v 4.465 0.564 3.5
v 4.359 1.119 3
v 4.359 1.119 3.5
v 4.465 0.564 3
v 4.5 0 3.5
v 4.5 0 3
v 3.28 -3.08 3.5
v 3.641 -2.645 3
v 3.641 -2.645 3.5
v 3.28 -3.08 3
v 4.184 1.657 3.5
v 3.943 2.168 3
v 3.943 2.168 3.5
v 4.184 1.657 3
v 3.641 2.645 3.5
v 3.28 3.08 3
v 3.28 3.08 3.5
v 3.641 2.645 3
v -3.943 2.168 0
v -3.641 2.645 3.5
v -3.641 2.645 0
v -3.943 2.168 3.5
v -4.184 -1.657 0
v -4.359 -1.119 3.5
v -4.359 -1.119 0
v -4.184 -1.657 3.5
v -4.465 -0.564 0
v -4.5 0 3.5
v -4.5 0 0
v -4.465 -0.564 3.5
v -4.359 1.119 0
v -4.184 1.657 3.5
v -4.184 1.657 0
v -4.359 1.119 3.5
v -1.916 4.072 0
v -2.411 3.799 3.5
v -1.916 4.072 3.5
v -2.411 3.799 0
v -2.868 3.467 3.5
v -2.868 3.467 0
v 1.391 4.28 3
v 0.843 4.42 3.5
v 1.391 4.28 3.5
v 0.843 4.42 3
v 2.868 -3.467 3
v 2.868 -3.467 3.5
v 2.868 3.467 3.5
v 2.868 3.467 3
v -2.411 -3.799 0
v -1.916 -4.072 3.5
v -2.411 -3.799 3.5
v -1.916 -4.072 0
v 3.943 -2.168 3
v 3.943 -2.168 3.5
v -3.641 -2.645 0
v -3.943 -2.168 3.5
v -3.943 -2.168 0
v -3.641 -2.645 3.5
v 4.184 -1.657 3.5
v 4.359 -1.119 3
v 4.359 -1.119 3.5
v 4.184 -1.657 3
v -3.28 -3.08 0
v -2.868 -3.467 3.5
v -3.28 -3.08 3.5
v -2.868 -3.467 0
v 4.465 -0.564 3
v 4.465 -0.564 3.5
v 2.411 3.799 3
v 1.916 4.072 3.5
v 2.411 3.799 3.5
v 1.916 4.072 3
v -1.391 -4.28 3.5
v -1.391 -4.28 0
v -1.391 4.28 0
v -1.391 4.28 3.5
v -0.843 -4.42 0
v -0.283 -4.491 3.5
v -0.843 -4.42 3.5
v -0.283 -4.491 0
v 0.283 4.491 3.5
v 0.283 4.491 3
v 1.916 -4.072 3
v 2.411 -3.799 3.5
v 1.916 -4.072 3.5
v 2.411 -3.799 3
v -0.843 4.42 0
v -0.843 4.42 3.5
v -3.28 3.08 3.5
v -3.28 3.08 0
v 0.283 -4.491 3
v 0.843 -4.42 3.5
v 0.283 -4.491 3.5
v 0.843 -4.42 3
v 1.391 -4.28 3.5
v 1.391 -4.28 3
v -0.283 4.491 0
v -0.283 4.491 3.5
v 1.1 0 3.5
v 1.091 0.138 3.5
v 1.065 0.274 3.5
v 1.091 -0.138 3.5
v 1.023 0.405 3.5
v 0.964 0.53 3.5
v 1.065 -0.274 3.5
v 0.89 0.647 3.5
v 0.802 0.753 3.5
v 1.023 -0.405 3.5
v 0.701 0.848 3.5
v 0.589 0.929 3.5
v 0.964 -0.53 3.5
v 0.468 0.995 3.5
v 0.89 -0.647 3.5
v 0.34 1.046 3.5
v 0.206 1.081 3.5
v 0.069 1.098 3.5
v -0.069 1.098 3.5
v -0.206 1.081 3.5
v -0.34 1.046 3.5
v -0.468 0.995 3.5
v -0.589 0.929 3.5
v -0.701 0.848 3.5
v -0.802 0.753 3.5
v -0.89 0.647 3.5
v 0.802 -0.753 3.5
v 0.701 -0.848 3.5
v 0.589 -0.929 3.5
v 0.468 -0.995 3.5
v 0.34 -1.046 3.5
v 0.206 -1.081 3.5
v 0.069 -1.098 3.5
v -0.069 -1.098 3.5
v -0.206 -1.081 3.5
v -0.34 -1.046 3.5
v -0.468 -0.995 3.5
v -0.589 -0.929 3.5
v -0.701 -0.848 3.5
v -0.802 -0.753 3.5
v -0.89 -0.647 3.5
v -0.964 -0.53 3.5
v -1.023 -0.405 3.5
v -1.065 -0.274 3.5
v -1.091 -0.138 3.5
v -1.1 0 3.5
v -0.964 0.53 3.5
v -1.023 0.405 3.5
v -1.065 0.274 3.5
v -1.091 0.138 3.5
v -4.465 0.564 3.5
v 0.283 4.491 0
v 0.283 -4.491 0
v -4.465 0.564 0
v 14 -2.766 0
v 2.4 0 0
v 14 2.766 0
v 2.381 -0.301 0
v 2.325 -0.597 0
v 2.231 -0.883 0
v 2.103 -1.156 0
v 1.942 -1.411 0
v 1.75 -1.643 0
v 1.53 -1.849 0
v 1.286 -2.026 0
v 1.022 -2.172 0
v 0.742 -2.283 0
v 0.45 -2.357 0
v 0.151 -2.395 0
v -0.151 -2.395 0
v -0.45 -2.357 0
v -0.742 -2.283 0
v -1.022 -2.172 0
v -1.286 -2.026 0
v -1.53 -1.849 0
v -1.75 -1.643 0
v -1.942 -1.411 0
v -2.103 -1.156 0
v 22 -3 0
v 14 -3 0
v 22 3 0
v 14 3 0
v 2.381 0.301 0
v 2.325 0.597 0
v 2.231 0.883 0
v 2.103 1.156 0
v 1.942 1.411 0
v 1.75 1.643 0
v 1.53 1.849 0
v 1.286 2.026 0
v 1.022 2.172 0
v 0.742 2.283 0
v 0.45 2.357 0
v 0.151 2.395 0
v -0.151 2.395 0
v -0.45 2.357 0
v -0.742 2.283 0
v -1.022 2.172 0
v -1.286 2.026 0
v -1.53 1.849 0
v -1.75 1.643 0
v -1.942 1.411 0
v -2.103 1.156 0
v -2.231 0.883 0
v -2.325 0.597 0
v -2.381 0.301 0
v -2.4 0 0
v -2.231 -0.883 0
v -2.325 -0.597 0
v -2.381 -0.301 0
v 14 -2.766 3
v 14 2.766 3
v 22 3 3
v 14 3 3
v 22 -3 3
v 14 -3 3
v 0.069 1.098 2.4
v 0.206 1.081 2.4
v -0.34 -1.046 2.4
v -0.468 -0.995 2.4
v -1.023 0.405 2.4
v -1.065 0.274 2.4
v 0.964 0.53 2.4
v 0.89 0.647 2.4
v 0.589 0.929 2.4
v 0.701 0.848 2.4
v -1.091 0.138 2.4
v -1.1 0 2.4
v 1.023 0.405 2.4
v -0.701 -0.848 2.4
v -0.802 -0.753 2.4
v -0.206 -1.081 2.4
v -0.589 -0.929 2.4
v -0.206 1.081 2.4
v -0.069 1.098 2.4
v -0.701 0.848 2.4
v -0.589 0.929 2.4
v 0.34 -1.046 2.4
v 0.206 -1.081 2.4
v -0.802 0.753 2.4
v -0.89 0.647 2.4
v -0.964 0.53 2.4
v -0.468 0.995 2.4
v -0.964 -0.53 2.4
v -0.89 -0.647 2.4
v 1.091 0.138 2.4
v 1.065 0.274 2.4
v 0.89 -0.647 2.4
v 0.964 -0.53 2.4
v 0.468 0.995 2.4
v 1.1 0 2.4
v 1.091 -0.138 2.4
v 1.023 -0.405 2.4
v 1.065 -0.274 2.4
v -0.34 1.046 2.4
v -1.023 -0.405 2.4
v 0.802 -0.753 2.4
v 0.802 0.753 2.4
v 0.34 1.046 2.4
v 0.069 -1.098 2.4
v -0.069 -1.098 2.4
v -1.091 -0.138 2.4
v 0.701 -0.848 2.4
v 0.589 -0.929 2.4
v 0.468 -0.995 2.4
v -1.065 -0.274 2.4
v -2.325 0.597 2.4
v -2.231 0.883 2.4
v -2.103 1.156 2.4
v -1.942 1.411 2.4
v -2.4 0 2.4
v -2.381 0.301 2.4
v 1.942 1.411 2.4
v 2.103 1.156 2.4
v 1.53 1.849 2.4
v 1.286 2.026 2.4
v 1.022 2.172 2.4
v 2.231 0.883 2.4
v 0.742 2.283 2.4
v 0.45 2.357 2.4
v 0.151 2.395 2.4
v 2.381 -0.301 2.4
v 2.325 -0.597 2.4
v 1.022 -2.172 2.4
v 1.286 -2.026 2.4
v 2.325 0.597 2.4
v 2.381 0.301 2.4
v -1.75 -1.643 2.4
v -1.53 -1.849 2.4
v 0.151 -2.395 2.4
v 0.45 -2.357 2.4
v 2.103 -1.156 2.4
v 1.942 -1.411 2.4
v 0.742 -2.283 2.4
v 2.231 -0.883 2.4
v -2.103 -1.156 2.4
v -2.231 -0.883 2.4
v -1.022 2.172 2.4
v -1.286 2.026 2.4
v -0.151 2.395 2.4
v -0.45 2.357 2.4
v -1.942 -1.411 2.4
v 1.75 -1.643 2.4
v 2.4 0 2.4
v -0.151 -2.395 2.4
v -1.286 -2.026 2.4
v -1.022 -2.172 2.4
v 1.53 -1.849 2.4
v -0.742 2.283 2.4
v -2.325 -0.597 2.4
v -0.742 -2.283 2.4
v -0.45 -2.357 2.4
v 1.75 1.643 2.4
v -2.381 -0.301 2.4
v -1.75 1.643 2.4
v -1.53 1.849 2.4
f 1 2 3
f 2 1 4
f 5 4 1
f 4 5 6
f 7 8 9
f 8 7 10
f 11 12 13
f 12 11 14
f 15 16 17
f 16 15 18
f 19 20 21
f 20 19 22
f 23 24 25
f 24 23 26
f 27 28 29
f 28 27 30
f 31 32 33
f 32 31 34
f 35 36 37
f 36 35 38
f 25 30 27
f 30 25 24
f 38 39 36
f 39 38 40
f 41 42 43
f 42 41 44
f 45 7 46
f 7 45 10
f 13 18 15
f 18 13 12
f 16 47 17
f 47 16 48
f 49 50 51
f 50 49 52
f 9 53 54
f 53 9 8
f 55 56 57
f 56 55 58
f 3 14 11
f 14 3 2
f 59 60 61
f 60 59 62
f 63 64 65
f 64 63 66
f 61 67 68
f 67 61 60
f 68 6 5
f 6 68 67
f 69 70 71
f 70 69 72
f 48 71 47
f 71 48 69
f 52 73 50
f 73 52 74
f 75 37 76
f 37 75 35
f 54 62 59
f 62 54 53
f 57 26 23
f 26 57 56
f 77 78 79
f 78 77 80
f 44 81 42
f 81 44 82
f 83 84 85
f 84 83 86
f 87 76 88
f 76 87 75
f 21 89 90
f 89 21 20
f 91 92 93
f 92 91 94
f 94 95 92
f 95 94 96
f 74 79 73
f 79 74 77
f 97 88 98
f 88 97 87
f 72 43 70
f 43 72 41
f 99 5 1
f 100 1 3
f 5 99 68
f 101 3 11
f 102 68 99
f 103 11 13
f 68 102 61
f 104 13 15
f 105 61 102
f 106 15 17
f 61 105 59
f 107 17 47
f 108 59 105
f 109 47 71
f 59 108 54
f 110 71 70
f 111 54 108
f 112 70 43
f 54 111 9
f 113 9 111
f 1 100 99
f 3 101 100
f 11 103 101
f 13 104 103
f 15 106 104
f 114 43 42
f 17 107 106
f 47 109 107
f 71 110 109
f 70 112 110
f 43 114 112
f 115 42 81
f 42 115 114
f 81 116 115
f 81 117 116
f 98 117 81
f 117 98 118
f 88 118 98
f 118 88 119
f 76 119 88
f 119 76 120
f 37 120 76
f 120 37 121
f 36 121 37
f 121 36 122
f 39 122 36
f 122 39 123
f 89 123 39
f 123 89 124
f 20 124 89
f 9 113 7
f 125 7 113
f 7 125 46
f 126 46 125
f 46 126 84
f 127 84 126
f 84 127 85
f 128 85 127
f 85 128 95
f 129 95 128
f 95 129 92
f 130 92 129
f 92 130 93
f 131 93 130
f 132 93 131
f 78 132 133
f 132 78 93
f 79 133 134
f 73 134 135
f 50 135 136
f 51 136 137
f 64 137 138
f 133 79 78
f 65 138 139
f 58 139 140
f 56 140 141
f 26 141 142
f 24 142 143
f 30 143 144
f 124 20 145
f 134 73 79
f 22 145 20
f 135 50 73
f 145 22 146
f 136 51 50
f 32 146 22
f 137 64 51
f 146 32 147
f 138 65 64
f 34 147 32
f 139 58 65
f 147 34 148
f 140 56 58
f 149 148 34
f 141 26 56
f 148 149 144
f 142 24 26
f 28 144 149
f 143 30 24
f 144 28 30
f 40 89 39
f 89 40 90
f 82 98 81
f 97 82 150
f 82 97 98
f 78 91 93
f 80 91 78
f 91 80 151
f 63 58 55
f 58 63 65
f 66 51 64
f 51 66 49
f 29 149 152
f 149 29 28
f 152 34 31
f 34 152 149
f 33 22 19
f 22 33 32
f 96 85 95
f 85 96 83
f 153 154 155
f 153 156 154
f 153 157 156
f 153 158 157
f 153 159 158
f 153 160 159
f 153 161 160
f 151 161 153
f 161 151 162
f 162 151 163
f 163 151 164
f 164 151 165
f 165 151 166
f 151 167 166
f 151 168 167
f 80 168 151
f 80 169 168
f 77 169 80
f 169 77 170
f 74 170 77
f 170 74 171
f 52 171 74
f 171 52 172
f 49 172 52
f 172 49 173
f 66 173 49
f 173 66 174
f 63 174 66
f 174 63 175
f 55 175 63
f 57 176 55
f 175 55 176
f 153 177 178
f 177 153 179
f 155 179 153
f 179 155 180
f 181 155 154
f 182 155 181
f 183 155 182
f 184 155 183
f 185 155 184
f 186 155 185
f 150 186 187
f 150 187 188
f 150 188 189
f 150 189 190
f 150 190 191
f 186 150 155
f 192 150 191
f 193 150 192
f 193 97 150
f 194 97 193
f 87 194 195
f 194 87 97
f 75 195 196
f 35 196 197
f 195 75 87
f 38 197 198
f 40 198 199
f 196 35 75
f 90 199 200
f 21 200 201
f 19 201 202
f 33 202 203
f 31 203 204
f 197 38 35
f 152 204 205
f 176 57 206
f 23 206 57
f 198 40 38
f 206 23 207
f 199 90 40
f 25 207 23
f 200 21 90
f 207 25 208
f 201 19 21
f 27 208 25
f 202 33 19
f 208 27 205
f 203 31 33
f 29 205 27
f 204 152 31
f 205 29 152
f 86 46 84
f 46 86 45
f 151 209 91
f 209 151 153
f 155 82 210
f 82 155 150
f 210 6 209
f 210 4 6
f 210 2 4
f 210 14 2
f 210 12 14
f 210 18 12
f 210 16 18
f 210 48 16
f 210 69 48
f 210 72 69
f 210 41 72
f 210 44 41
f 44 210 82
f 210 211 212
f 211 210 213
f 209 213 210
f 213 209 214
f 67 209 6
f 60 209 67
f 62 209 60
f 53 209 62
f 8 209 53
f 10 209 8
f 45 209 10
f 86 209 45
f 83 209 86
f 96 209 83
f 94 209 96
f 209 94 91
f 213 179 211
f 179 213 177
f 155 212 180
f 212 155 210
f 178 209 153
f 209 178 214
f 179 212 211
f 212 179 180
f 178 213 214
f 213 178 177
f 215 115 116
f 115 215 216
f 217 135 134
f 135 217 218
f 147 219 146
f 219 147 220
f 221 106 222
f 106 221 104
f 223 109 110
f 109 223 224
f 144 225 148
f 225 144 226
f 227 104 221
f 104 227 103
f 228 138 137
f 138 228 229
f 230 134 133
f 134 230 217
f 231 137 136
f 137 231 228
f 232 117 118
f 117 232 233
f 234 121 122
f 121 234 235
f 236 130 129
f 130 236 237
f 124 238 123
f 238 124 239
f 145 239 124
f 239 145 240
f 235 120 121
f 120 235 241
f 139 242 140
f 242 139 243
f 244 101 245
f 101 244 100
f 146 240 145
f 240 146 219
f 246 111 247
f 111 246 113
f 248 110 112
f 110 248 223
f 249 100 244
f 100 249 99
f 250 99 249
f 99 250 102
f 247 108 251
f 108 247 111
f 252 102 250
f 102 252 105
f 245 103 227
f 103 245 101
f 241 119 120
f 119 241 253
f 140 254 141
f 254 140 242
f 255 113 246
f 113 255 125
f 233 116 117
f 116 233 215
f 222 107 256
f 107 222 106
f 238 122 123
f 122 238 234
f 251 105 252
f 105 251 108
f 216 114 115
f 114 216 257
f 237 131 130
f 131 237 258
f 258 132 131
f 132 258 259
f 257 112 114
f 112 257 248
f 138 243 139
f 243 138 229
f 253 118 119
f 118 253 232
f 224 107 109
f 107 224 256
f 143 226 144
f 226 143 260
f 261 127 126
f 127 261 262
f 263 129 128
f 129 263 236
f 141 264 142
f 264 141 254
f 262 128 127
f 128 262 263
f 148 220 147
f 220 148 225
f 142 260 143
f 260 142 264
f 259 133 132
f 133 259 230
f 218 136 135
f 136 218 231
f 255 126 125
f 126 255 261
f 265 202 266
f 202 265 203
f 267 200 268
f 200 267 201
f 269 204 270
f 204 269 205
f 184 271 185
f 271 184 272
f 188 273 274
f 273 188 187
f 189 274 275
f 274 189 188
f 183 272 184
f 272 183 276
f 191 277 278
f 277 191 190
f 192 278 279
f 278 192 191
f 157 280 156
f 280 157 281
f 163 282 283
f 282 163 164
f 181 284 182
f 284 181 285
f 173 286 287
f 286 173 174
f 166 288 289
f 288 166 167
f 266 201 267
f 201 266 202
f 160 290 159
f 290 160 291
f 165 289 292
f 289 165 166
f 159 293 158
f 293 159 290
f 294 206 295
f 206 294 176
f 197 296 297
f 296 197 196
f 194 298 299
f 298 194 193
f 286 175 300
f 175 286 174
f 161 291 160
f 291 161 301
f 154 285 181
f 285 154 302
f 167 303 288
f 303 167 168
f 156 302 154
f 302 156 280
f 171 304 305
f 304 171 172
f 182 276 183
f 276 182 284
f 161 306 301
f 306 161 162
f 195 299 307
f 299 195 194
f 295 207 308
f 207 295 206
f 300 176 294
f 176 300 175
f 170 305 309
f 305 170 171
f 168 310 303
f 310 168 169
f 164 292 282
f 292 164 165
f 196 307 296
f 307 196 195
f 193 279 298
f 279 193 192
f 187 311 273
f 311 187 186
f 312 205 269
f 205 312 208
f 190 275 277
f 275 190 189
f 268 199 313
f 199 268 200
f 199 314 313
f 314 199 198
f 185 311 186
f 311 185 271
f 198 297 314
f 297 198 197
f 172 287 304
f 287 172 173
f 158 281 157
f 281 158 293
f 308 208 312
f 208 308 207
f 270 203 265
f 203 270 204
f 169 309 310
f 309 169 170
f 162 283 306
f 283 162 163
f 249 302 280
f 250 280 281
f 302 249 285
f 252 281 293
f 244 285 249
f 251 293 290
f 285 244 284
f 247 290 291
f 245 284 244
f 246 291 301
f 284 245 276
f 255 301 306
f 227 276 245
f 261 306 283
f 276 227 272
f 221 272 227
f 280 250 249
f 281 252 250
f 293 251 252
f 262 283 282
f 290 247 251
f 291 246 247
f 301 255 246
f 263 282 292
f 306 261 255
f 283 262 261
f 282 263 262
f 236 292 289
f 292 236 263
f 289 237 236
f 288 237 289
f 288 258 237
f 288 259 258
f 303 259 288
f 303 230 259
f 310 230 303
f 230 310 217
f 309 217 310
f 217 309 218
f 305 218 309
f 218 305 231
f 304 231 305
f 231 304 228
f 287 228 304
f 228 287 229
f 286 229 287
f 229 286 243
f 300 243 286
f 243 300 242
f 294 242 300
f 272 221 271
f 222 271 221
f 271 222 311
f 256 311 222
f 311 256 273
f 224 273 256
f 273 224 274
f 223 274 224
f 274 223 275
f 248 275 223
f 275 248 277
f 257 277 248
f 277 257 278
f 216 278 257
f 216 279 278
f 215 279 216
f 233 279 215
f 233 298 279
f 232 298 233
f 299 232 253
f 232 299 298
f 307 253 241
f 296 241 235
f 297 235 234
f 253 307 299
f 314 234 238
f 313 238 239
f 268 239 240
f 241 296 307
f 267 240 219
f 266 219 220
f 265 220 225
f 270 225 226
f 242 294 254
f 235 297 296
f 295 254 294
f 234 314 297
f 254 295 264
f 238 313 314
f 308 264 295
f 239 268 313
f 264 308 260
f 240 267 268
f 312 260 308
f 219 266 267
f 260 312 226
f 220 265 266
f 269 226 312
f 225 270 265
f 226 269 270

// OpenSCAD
// ===================================================================
// 智能玩具电子锁盒 - 零部件 4: 舵机旋转锁舌 (Servo Locking Cam Horn)
// CAD 级高精度生产模型
// ===================================================================

$fn = 50;

horn_hub_r    = 4.5;
horn_hub_h    = 3.5;
spline_hole_d = 4.8;  // MG90S 齿轮轴外径 (标准 25T 微型花键配合)
cam_len       = 18.0; // 摆臂旋转半径
tongue_thick  = 3.0;

module servo_cam() {
    difference() {
        union() {
            // 1. 舵机轴连接轴套 (Hub)
            cylinder(r=horn_hub_r, h=horn_hub_h);

            // 2. 旋转摆臂 (Arm)
            hull() {
                cylinder(r=horn_hub_r, h=tongue_thick);
                translate([cam_len - 2, 0, 0])
                    cylinder(r=2.5, h=tongue_thick);
            }

            // 3. 前端金属啮合锁舌片 (Beveled Locking Tongue)
            translate([cam_len - 4, -3.0, 0])
                cube([8.0, 6.0, tongue_thick]);
        }

        // 中心固定螺丝穿孔 (适合 M2 自攻螺丝拧入舵机输出齿轮中心)
        translate([0, 0, -1])
            cylinder(d=2.2, h=horn_hub_h + 2);

        // 花键沉孔 (深 2.5mm)
        translate([0, 0, -0.1])
            cylinder(d=spline_hole_d, h=2.5);
    }
}

servo_cam();
